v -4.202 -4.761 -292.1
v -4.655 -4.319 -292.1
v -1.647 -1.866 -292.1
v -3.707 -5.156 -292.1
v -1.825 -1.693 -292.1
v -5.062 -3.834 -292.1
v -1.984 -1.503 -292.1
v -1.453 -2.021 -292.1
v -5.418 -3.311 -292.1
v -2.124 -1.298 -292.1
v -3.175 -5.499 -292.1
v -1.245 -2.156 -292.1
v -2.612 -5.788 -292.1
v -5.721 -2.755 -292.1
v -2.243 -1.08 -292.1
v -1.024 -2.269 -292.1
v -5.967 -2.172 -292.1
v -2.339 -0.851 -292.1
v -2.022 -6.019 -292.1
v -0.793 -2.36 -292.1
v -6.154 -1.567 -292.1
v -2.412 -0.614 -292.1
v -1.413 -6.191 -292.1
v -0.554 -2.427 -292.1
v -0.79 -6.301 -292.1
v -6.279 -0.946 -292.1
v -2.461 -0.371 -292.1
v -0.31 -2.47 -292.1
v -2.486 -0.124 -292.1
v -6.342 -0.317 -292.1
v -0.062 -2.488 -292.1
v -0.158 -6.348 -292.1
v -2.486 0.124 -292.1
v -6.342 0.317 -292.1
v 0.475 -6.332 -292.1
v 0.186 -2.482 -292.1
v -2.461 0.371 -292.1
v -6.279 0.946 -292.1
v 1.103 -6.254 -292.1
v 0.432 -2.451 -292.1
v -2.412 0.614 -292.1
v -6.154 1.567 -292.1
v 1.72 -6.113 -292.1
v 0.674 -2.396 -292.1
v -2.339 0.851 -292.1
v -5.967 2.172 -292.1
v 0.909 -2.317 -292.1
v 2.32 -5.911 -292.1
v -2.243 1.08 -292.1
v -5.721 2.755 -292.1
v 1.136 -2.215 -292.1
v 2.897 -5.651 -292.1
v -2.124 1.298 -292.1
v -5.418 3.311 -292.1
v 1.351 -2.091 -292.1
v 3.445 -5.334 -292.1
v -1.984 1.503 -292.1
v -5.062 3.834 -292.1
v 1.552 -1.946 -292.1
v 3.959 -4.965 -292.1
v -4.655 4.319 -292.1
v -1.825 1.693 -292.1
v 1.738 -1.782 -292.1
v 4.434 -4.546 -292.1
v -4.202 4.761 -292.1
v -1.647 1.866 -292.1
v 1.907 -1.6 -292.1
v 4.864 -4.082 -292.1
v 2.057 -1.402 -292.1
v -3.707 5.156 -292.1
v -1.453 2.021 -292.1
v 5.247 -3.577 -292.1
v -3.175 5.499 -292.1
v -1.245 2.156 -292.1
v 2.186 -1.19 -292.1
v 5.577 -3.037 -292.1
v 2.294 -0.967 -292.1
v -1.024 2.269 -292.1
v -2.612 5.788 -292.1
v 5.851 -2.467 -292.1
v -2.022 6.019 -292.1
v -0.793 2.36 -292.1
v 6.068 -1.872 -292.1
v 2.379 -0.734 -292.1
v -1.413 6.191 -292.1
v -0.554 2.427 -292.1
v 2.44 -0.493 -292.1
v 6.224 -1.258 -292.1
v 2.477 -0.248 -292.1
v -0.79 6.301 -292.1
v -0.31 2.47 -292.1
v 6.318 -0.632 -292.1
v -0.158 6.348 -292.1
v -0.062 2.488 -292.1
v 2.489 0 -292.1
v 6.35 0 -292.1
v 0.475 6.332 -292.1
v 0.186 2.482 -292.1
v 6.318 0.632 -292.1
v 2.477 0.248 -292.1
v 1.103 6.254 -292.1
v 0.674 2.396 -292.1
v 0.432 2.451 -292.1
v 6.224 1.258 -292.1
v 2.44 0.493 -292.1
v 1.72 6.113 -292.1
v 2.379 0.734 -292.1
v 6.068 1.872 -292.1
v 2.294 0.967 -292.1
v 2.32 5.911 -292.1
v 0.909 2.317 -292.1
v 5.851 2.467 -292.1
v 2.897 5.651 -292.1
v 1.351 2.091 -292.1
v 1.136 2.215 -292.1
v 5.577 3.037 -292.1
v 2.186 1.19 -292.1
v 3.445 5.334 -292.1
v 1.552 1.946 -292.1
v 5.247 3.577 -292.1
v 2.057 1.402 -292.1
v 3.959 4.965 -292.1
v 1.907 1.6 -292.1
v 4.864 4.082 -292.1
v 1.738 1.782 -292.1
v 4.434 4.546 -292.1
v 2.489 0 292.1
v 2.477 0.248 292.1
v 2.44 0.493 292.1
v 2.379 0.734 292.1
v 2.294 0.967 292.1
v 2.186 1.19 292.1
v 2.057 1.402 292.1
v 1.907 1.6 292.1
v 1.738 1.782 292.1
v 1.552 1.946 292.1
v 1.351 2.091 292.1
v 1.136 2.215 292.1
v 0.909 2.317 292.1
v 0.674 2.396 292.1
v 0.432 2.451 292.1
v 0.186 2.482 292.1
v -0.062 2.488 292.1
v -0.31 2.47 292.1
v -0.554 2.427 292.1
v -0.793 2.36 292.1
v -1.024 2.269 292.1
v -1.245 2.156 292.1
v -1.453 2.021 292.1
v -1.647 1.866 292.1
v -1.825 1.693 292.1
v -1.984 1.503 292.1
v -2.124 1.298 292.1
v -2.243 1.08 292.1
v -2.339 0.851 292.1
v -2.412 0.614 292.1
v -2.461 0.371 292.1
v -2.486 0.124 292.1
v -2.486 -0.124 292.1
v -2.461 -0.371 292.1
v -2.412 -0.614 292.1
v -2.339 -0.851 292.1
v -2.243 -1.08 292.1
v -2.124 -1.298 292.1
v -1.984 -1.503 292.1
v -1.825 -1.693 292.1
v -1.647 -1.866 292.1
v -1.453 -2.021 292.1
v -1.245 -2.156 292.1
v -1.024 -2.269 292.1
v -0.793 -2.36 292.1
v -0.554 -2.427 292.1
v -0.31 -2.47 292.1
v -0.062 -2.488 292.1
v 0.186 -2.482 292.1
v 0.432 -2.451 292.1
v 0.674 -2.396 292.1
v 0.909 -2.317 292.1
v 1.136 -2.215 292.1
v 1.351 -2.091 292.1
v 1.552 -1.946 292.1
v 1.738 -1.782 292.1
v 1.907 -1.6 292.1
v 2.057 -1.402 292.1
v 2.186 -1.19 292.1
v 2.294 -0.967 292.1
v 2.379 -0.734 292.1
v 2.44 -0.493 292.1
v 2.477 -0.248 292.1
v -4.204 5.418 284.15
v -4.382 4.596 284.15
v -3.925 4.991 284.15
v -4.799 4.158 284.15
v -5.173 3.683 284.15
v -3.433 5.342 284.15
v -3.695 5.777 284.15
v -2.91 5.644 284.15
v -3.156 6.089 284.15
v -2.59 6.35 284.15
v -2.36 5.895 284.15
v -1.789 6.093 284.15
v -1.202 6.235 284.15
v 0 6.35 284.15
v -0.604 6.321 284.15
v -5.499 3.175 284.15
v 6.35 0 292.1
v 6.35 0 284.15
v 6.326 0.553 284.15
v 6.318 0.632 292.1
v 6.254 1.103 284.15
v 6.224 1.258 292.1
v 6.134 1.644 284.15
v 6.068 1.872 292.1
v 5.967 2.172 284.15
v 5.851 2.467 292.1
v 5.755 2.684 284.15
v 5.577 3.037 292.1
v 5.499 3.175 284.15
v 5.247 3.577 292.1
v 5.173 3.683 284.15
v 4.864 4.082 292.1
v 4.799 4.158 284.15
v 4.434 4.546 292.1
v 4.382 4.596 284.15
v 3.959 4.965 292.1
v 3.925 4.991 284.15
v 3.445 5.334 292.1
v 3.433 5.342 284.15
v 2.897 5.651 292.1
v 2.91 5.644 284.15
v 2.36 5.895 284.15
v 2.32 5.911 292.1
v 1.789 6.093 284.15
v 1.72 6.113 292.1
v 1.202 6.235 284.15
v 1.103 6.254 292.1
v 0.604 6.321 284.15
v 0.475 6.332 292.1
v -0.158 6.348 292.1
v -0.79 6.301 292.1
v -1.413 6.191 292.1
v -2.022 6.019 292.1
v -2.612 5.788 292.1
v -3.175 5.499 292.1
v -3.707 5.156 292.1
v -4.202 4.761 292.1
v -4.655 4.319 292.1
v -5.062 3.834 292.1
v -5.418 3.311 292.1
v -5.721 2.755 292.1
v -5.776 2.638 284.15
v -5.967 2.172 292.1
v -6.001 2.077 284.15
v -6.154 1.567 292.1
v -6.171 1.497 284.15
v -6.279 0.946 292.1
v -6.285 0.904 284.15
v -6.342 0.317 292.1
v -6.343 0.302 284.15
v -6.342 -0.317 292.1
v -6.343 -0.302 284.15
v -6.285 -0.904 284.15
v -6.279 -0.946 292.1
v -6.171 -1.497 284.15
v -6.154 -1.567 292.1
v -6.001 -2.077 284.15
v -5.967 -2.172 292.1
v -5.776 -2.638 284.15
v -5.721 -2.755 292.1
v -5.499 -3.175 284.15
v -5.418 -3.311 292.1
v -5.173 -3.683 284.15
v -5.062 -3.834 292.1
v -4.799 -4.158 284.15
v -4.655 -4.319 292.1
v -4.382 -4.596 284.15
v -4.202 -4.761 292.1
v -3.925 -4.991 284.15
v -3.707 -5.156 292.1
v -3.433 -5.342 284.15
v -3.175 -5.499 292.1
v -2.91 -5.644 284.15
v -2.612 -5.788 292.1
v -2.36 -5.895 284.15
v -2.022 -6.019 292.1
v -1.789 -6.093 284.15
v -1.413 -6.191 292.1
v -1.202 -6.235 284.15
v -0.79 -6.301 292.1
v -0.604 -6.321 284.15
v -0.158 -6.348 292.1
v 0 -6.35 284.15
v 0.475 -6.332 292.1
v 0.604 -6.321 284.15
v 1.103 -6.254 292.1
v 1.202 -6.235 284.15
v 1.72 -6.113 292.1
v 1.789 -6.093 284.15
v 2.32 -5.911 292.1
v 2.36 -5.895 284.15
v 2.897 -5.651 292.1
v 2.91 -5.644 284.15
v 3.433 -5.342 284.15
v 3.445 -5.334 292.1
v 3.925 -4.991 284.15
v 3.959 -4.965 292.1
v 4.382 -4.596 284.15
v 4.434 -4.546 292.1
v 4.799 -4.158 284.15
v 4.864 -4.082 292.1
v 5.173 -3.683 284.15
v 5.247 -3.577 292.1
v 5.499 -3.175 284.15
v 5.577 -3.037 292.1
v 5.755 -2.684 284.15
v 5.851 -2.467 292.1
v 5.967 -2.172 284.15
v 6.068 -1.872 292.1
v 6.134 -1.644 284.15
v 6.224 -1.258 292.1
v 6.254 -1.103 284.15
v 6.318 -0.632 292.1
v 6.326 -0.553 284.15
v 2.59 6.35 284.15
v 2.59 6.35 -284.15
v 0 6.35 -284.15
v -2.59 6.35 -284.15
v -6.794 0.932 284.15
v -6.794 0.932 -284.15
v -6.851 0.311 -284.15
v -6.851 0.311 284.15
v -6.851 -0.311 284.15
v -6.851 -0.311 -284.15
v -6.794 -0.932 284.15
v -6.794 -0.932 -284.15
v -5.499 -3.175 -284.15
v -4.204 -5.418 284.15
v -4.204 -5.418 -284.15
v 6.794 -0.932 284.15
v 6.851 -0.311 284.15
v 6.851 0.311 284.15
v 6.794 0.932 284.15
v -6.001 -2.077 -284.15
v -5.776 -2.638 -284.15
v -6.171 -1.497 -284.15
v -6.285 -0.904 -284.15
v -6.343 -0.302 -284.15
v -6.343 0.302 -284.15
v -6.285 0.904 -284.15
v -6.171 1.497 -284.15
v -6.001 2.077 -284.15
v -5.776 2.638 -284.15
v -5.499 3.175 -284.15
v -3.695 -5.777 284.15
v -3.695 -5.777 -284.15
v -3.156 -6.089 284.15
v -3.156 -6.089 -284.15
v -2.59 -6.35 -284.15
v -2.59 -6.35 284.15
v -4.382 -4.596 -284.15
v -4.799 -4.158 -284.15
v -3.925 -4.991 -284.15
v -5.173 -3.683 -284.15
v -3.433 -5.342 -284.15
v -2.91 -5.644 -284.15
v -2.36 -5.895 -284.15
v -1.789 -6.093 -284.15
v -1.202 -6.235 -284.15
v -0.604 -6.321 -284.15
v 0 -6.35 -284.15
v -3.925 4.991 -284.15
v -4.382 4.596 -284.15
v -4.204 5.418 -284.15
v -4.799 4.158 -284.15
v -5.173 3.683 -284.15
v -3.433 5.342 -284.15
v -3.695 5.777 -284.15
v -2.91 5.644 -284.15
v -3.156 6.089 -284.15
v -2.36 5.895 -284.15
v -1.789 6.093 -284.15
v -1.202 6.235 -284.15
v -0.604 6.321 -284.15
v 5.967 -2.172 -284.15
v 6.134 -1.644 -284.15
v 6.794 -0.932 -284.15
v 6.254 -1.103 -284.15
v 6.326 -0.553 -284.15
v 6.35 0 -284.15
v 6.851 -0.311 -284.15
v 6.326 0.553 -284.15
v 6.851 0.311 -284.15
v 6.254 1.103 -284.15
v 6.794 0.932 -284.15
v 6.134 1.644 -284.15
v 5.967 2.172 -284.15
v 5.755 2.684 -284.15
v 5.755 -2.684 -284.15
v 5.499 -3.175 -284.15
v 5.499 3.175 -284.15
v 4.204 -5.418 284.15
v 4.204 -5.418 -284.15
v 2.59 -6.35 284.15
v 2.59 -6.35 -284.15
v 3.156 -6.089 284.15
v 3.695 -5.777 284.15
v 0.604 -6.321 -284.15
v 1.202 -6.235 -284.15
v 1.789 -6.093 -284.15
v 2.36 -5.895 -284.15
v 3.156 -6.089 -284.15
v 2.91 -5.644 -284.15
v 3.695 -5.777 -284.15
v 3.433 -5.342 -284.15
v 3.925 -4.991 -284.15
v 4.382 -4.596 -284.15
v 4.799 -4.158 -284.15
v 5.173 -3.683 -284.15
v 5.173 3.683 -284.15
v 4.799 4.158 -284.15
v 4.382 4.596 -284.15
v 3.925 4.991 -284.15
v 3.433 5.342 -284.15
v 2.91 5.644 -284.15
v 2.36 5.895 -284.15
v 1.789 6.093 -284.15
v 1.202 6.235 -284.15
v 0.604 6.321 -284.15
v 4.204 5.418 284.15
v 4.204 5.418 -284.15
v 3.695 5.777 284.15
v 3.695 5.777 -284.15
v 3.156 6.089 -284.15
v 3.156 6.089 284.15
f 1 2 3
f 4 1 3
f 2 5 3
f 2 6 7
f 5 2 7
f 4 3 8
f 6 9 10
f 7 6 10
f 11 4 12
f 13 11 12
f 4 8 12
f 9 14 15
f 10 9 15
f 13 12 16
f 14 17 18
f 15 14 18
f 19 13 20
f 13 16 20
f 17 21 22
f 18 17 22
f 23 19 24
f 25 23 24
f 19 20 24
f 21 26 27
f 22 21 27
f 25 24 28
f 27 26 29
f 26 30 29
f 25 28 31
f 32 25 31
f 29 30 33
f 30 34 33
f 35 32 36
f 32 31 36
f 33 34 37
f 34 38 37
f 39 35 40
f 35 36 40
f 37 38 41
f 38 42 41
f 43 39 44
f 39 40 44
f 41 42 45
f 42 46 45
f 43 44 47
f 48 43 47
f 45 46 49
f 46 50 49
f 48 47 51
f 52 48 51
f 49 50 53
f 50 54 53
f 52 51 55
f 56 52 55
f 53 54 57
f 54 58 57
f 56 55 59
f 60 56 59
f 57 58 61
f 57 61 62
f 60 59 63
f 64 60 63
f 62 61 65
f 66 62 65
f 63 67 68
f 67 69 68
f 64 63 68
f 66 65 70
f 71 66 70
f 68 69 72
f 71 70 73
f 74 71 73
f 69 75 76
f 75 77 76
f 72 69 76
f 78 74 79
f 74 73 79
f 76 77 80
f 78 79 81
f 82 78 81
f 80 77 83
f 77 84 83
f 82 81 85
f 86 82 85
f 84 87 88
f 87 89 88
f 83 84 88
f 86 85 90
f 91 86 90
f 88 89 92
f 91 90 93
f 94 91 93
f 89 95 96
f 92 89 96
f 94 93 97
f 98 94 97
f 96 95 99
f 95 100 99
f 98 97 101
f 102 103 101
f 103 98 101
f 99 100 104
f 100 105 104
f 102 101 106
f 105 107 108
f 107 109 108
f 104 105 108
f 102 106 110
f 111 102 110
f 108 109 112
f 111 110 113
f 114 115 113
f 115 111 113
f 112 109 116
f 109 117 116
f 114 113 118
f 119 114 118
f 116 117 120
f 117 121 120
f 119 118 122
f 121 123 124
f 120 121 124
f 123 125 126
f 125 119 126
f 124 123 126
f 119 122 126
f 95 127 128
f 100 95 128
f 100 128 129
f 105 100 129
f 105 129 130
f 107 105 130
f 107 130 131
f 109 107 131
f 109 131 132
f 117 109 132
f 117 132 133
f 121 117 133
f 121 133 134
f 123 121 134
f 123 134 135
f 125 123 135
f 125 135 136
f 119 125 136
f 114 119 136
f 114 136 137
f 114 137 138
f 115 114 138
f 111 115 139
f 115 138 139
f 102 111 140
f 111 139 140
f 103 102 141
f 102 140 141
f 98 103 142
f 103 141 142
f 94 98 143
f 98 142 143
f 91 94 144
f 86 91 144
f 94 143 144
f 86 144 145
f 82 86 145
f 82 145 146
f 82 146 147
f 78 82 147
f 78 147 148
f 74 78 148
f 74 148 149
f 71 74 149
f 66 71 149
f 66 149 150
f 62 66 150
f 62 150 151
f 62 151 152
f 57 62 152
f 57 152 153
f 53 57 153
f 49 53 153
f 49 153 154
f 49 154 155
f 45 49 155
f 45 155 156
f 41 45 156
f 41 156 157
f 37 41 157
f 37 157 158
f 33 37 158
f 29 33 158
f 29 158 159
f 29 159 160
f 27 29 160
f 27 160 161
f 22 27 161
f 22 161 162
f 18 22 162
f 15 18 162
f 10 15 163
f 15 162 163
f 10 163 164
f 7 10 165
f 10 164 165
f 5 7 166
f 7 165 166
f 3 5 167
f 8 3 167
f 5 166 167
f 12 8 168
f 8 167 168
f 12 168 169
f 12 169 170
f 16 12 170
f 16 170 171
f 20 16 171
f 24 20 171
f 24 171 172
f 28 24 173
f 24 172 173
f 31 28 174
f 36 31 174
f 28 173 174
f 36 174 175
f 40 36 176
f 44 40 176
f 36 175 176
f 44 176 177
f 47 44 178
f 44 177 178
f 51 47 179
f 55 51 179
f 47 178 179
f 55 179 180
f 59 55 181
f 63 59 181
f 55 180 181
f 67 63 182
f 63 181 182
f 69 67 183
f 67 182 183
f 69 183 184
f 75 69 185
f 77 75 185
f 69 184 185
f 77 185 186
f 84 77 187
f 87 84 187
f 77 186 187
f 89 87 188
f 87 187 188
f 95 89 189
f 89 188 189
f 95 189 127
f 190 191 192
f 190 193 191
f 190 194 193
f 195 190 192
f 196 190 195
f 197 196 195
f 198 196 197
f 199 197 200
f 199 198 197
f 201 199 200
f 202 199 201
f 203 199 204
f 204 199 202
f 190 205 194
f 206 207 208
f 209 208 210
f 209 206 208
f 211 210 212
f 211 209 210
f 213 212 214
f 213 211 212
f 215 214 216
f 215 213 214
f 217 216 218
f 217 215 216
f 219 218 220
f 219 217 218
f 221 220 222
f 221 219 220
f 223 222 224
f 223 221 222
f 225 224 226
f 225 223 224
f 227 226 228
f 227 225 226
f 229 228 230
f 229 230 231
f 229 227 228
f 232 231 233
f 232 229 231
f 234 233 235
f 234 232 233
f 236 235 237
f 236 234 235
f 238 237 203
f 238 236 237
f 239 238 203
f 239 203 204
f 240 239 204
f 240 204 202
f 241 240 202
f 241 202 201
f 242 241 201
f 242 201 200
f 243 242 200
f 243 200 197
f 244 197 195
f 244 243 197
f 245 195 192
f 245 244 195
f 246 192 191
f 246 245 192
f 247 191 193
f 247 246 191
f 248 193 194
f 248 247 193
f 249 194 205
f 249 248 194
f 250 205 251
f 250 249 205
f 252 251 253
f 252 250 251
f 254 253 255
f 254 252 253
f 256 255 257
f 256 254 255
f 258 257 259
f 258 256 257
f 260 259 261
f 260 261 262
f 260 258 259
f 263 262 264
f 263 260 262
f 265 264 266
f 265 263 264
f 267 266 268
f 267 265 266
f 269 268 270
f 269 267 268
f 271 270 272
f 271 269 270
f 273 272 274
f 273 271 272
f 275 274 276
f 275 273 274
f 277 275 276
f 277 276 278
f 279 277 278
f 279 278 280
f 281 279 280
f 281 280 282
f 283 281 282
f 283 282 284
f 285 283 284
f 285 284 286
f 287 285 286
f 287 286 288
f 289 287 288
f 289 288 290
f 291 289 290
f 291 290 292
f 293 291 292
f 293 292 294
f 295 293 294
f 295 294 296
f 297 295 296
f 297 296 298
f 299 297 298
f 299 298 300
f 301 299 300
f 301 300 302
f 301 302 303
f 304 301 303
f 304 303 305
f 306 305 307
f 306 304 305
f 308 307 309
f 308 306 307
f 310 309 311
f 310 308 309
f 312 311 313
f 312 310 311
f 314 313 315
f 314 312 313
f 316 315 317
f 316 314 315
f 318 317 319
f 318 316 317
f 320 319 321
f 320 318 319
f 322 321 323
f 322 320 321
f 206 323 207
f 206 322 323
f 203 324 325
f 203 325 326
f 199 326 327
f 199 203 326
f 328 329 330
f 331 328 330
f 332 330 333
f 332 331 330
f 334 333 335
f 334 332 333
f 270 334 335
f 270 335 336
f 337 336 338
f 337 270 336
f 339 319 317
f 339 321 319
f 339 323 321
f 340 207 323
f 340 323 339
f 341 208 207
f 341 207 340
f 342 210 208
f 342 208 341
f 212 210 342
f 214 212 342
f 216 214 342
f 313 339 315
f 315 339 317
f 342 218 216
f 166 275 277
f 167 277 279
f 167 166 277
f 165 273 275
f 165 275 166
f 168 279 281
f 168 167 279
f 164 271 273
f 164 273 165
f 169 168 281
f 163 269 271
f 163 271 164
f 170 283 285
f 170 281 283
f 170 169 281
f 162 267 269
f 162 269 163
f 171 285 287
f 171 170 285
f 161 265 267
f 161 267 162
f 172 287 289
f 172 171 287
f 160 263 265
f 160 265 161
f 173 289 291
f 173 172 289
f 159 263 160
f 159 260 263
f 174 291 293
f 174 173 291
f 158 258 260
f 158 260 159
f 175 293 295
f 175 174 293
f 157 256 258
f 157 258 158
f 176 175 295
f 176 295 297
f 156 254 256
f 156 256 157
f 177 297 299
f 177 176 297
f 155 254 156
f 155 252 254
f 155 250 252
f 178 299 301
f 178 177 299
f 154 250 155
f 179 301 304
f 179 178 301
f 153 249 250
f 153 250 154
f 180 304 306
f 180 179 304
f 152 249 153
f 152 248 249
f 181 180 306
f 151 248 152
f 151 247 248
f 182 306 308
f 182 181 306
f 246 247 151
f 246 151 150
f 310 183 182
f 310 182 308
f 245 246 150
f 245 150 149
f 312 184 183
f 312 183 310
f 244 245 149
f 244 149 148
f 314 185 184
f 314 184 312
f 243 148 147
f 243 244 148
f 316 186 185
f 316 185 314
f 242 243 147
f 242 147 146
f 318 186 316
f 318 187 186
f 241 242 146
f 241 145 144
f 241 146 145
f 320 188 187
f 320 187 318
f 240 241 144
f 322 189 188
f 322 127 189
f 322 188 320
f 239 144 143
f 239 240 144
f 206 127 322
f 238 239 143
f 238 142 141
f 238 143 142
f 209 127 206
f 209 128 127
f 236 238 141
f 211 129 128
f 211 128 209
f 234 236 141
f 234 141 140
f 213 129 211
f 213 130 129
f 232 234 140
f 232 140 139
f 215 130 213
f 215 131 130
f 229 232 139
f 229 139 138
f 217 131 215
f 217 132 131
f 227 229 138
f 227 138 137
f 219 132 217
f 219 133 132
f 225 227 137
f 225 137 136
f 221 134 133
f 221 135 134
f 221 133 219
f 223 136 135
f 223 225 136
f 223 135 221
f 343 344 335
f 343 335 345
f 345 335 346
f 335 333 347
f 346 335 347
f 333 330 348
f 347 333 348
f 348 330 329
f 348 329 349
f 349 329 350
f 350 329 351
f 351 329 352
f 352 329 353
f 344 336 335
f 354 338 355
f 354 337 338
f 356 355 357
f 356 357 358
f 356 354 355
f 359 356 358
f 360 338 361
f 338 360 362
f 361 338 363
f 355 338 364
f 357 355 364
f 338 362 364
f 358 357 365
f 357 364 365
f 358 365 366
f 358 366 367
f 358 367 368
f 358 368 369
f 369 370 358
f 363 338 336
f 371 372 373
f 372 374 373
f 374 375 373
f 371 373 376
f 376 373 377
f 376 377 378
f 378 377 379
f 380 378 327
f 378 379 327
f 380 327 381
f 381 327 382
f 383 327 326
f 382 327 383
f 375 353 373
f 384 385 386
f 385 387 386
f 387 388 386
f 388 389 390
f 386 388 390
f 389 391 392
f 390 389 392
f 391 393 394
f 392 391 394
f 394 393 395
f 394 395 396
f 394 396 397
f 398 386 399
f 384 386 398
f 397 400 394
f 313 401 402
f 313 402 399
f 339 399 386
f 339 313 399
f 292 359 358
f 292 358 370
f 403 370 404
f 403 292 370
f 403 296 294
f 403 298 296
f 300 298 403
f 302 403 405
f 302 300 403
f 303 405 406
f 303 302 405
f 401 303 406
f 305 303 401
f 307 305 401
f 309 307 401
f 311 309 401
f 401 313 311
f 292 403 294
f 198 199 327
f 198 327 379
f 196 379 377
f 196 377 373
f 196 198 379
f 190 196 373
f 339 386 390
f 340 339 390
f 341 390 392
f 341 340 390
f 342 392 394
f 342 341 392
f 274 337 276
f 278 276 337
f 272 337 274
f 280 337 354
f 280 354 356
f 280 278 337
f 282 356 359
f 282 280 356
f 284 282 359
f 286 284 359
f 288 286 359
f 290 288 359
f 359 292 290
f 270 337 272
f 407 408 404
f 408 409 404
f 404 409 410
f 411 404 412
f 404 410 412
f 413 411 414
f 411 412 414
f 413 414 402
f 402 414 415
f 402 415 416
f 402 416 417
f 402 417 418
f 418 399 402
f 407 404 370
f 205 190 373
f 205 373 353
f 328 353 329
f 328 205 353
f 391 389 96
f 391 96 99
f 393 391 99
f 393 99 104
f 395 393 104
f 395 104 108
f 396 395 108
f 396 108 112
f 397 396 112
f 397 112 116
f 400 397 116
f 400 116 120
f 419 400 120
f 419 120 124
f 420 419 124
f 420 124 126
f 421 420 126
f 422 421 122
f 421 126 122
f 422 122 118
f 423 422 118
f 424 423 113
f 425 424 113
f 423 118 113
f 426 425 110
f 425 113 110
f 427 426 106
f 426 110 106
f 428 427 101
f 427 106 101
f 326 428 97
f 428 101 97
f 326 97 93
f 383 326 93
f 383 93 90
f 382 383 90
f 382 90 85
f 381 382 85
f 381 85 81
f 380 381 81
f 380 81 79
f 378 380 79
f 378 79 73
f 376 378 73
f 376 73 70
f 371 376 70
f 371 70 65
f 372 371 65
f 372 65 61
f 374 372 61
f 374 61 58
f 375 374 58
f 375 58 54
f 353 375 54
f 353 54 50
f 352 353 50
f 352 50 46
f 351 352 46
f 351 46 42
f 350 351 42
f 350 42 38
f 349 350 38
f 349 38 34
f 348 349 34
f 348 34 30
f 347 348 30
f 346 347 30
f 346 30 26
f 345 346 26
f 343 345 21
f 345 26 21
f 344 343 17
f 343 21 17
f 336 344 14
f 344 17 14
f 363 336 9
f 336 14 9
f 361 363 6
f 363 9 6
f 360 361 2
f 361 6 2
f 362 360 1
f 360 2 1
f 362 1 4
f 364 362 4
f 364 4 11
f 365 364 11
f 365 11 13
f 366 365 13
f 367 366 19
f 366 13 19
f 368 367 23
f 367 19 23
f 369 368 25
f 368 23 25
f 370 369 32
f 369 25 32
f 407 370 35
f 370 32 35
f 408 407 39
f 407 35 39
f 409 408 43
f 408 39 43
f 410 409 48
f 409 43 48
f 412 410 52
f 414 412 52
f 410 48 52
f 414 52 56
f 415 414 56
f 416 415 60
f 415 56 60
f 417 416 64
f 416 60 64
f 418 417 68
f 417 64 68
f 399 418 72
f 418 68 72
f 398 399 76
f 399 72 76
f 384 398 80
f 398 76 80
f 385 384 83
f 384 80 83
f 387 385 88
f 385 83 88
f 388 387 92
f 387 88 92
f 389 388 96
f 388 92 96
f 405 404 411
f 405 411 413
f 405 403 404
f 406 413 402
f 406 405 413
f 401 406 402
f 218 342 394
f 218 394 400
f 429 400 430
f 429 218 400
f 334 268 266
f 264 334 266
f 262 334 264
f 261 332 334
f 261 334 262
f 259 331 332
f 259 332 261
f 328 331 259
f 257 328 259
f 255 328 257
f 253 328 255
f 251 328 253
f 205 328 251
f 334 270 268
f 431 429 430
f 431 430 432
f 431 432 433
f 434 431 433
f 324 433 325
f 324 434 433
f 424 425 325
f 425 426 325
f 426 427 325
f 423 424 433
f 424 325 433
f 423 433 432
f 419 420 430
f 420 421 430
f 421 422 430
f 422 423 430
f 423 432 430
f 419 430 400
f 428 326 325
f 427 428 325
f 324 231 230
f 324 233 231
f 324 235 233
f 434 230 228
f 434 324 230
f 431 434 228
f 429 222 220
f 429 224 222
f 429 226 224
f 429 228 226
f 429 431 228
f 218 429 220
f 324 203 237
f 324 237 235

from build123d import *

# Parameters (mm, degrees)
BOSS_EXTRUDE1_DEPTH = 292.1
SKETCH3_OUTSIDE_W   = 133.568
SKETCH3_OUTSIDE_H   = 131.604
SKETCH3_OUTSIDE_R   = 6.35
CUT_EXTRUDE2_DEPTH  = 7.9502
SKETCH4_OUTSIDE_W   = 133.568
SKETCH4_OUTSIDE_H   = 131.604
SKETCH4_OUTSIDE_R   = 6.858
CUT_EXTRUDE3_DEPTH  = 585.280519813
SKETCH5_R           = 2.4892
CUT_EXTRUDE4_DEPTH  = 585.274759564


with BuildPart() as part:
    # Sketch1 → Boss-Extrude1 (new, symmetric)
    with BuildSketch(Plane.XY):
        Polygon((7.332348419, 0), (3.666174209, 6.35), (-3.666174209, 6.35), (-7.332348419, 0), (-3.666174209, -6.35), (3.666174209, -6.35), align=None)
    extrude(amount=BOSS_EXTRUDE1_DEPTH, both=True)

    # Sketch3 outside → Cut-Extrude2 (cut)
    with BuildSketch(Plane.XY.offset(292.1)):
        Rectangle(SKETCH3_OUTSIDE_W, SKETCH3_OUTSIDE_H)
        Circle(SKETCH3_OUTSIDE_R, mode=Mode.SUBTRACT)
    cut_extrude2 = extrude(amount=-CUT_EXTRUDE2_DEPTH, mode=Mode.SUBTRACT)

    # Mirror1: Cut-Extrude2 across plane
    add(cut_extrude2.mirror(Plane.XY), mode=Mode.SUBTRACT)

    # Sketch4 outside → Cut-Extrude3 (cut, through all)
    with BuildSketch(Plane.XY.offset(292.1)):
        Rectangle(SKETCH4_OUTSIDE_W, SKETCH4_OUTSIDE_H)
        Circle(SKETCH4_OUTSIDE_R, mode=Mode.SUBTRACT)
    extrude(amount=-CUT_EXTRUDE3_DEPTH, mode=Mode.SUBTRACT)

    # Sketch5 → Cut-Extrude4 (cut, through all)
    with BuildSketch(Plane.XY.offset(292.1)):
        Circle(SKETCH5_R)
    extrude(amount=-CUT_EXTRUDE4_DEPTH, mode=Mode.SUBTRACT)


solid = part.part
